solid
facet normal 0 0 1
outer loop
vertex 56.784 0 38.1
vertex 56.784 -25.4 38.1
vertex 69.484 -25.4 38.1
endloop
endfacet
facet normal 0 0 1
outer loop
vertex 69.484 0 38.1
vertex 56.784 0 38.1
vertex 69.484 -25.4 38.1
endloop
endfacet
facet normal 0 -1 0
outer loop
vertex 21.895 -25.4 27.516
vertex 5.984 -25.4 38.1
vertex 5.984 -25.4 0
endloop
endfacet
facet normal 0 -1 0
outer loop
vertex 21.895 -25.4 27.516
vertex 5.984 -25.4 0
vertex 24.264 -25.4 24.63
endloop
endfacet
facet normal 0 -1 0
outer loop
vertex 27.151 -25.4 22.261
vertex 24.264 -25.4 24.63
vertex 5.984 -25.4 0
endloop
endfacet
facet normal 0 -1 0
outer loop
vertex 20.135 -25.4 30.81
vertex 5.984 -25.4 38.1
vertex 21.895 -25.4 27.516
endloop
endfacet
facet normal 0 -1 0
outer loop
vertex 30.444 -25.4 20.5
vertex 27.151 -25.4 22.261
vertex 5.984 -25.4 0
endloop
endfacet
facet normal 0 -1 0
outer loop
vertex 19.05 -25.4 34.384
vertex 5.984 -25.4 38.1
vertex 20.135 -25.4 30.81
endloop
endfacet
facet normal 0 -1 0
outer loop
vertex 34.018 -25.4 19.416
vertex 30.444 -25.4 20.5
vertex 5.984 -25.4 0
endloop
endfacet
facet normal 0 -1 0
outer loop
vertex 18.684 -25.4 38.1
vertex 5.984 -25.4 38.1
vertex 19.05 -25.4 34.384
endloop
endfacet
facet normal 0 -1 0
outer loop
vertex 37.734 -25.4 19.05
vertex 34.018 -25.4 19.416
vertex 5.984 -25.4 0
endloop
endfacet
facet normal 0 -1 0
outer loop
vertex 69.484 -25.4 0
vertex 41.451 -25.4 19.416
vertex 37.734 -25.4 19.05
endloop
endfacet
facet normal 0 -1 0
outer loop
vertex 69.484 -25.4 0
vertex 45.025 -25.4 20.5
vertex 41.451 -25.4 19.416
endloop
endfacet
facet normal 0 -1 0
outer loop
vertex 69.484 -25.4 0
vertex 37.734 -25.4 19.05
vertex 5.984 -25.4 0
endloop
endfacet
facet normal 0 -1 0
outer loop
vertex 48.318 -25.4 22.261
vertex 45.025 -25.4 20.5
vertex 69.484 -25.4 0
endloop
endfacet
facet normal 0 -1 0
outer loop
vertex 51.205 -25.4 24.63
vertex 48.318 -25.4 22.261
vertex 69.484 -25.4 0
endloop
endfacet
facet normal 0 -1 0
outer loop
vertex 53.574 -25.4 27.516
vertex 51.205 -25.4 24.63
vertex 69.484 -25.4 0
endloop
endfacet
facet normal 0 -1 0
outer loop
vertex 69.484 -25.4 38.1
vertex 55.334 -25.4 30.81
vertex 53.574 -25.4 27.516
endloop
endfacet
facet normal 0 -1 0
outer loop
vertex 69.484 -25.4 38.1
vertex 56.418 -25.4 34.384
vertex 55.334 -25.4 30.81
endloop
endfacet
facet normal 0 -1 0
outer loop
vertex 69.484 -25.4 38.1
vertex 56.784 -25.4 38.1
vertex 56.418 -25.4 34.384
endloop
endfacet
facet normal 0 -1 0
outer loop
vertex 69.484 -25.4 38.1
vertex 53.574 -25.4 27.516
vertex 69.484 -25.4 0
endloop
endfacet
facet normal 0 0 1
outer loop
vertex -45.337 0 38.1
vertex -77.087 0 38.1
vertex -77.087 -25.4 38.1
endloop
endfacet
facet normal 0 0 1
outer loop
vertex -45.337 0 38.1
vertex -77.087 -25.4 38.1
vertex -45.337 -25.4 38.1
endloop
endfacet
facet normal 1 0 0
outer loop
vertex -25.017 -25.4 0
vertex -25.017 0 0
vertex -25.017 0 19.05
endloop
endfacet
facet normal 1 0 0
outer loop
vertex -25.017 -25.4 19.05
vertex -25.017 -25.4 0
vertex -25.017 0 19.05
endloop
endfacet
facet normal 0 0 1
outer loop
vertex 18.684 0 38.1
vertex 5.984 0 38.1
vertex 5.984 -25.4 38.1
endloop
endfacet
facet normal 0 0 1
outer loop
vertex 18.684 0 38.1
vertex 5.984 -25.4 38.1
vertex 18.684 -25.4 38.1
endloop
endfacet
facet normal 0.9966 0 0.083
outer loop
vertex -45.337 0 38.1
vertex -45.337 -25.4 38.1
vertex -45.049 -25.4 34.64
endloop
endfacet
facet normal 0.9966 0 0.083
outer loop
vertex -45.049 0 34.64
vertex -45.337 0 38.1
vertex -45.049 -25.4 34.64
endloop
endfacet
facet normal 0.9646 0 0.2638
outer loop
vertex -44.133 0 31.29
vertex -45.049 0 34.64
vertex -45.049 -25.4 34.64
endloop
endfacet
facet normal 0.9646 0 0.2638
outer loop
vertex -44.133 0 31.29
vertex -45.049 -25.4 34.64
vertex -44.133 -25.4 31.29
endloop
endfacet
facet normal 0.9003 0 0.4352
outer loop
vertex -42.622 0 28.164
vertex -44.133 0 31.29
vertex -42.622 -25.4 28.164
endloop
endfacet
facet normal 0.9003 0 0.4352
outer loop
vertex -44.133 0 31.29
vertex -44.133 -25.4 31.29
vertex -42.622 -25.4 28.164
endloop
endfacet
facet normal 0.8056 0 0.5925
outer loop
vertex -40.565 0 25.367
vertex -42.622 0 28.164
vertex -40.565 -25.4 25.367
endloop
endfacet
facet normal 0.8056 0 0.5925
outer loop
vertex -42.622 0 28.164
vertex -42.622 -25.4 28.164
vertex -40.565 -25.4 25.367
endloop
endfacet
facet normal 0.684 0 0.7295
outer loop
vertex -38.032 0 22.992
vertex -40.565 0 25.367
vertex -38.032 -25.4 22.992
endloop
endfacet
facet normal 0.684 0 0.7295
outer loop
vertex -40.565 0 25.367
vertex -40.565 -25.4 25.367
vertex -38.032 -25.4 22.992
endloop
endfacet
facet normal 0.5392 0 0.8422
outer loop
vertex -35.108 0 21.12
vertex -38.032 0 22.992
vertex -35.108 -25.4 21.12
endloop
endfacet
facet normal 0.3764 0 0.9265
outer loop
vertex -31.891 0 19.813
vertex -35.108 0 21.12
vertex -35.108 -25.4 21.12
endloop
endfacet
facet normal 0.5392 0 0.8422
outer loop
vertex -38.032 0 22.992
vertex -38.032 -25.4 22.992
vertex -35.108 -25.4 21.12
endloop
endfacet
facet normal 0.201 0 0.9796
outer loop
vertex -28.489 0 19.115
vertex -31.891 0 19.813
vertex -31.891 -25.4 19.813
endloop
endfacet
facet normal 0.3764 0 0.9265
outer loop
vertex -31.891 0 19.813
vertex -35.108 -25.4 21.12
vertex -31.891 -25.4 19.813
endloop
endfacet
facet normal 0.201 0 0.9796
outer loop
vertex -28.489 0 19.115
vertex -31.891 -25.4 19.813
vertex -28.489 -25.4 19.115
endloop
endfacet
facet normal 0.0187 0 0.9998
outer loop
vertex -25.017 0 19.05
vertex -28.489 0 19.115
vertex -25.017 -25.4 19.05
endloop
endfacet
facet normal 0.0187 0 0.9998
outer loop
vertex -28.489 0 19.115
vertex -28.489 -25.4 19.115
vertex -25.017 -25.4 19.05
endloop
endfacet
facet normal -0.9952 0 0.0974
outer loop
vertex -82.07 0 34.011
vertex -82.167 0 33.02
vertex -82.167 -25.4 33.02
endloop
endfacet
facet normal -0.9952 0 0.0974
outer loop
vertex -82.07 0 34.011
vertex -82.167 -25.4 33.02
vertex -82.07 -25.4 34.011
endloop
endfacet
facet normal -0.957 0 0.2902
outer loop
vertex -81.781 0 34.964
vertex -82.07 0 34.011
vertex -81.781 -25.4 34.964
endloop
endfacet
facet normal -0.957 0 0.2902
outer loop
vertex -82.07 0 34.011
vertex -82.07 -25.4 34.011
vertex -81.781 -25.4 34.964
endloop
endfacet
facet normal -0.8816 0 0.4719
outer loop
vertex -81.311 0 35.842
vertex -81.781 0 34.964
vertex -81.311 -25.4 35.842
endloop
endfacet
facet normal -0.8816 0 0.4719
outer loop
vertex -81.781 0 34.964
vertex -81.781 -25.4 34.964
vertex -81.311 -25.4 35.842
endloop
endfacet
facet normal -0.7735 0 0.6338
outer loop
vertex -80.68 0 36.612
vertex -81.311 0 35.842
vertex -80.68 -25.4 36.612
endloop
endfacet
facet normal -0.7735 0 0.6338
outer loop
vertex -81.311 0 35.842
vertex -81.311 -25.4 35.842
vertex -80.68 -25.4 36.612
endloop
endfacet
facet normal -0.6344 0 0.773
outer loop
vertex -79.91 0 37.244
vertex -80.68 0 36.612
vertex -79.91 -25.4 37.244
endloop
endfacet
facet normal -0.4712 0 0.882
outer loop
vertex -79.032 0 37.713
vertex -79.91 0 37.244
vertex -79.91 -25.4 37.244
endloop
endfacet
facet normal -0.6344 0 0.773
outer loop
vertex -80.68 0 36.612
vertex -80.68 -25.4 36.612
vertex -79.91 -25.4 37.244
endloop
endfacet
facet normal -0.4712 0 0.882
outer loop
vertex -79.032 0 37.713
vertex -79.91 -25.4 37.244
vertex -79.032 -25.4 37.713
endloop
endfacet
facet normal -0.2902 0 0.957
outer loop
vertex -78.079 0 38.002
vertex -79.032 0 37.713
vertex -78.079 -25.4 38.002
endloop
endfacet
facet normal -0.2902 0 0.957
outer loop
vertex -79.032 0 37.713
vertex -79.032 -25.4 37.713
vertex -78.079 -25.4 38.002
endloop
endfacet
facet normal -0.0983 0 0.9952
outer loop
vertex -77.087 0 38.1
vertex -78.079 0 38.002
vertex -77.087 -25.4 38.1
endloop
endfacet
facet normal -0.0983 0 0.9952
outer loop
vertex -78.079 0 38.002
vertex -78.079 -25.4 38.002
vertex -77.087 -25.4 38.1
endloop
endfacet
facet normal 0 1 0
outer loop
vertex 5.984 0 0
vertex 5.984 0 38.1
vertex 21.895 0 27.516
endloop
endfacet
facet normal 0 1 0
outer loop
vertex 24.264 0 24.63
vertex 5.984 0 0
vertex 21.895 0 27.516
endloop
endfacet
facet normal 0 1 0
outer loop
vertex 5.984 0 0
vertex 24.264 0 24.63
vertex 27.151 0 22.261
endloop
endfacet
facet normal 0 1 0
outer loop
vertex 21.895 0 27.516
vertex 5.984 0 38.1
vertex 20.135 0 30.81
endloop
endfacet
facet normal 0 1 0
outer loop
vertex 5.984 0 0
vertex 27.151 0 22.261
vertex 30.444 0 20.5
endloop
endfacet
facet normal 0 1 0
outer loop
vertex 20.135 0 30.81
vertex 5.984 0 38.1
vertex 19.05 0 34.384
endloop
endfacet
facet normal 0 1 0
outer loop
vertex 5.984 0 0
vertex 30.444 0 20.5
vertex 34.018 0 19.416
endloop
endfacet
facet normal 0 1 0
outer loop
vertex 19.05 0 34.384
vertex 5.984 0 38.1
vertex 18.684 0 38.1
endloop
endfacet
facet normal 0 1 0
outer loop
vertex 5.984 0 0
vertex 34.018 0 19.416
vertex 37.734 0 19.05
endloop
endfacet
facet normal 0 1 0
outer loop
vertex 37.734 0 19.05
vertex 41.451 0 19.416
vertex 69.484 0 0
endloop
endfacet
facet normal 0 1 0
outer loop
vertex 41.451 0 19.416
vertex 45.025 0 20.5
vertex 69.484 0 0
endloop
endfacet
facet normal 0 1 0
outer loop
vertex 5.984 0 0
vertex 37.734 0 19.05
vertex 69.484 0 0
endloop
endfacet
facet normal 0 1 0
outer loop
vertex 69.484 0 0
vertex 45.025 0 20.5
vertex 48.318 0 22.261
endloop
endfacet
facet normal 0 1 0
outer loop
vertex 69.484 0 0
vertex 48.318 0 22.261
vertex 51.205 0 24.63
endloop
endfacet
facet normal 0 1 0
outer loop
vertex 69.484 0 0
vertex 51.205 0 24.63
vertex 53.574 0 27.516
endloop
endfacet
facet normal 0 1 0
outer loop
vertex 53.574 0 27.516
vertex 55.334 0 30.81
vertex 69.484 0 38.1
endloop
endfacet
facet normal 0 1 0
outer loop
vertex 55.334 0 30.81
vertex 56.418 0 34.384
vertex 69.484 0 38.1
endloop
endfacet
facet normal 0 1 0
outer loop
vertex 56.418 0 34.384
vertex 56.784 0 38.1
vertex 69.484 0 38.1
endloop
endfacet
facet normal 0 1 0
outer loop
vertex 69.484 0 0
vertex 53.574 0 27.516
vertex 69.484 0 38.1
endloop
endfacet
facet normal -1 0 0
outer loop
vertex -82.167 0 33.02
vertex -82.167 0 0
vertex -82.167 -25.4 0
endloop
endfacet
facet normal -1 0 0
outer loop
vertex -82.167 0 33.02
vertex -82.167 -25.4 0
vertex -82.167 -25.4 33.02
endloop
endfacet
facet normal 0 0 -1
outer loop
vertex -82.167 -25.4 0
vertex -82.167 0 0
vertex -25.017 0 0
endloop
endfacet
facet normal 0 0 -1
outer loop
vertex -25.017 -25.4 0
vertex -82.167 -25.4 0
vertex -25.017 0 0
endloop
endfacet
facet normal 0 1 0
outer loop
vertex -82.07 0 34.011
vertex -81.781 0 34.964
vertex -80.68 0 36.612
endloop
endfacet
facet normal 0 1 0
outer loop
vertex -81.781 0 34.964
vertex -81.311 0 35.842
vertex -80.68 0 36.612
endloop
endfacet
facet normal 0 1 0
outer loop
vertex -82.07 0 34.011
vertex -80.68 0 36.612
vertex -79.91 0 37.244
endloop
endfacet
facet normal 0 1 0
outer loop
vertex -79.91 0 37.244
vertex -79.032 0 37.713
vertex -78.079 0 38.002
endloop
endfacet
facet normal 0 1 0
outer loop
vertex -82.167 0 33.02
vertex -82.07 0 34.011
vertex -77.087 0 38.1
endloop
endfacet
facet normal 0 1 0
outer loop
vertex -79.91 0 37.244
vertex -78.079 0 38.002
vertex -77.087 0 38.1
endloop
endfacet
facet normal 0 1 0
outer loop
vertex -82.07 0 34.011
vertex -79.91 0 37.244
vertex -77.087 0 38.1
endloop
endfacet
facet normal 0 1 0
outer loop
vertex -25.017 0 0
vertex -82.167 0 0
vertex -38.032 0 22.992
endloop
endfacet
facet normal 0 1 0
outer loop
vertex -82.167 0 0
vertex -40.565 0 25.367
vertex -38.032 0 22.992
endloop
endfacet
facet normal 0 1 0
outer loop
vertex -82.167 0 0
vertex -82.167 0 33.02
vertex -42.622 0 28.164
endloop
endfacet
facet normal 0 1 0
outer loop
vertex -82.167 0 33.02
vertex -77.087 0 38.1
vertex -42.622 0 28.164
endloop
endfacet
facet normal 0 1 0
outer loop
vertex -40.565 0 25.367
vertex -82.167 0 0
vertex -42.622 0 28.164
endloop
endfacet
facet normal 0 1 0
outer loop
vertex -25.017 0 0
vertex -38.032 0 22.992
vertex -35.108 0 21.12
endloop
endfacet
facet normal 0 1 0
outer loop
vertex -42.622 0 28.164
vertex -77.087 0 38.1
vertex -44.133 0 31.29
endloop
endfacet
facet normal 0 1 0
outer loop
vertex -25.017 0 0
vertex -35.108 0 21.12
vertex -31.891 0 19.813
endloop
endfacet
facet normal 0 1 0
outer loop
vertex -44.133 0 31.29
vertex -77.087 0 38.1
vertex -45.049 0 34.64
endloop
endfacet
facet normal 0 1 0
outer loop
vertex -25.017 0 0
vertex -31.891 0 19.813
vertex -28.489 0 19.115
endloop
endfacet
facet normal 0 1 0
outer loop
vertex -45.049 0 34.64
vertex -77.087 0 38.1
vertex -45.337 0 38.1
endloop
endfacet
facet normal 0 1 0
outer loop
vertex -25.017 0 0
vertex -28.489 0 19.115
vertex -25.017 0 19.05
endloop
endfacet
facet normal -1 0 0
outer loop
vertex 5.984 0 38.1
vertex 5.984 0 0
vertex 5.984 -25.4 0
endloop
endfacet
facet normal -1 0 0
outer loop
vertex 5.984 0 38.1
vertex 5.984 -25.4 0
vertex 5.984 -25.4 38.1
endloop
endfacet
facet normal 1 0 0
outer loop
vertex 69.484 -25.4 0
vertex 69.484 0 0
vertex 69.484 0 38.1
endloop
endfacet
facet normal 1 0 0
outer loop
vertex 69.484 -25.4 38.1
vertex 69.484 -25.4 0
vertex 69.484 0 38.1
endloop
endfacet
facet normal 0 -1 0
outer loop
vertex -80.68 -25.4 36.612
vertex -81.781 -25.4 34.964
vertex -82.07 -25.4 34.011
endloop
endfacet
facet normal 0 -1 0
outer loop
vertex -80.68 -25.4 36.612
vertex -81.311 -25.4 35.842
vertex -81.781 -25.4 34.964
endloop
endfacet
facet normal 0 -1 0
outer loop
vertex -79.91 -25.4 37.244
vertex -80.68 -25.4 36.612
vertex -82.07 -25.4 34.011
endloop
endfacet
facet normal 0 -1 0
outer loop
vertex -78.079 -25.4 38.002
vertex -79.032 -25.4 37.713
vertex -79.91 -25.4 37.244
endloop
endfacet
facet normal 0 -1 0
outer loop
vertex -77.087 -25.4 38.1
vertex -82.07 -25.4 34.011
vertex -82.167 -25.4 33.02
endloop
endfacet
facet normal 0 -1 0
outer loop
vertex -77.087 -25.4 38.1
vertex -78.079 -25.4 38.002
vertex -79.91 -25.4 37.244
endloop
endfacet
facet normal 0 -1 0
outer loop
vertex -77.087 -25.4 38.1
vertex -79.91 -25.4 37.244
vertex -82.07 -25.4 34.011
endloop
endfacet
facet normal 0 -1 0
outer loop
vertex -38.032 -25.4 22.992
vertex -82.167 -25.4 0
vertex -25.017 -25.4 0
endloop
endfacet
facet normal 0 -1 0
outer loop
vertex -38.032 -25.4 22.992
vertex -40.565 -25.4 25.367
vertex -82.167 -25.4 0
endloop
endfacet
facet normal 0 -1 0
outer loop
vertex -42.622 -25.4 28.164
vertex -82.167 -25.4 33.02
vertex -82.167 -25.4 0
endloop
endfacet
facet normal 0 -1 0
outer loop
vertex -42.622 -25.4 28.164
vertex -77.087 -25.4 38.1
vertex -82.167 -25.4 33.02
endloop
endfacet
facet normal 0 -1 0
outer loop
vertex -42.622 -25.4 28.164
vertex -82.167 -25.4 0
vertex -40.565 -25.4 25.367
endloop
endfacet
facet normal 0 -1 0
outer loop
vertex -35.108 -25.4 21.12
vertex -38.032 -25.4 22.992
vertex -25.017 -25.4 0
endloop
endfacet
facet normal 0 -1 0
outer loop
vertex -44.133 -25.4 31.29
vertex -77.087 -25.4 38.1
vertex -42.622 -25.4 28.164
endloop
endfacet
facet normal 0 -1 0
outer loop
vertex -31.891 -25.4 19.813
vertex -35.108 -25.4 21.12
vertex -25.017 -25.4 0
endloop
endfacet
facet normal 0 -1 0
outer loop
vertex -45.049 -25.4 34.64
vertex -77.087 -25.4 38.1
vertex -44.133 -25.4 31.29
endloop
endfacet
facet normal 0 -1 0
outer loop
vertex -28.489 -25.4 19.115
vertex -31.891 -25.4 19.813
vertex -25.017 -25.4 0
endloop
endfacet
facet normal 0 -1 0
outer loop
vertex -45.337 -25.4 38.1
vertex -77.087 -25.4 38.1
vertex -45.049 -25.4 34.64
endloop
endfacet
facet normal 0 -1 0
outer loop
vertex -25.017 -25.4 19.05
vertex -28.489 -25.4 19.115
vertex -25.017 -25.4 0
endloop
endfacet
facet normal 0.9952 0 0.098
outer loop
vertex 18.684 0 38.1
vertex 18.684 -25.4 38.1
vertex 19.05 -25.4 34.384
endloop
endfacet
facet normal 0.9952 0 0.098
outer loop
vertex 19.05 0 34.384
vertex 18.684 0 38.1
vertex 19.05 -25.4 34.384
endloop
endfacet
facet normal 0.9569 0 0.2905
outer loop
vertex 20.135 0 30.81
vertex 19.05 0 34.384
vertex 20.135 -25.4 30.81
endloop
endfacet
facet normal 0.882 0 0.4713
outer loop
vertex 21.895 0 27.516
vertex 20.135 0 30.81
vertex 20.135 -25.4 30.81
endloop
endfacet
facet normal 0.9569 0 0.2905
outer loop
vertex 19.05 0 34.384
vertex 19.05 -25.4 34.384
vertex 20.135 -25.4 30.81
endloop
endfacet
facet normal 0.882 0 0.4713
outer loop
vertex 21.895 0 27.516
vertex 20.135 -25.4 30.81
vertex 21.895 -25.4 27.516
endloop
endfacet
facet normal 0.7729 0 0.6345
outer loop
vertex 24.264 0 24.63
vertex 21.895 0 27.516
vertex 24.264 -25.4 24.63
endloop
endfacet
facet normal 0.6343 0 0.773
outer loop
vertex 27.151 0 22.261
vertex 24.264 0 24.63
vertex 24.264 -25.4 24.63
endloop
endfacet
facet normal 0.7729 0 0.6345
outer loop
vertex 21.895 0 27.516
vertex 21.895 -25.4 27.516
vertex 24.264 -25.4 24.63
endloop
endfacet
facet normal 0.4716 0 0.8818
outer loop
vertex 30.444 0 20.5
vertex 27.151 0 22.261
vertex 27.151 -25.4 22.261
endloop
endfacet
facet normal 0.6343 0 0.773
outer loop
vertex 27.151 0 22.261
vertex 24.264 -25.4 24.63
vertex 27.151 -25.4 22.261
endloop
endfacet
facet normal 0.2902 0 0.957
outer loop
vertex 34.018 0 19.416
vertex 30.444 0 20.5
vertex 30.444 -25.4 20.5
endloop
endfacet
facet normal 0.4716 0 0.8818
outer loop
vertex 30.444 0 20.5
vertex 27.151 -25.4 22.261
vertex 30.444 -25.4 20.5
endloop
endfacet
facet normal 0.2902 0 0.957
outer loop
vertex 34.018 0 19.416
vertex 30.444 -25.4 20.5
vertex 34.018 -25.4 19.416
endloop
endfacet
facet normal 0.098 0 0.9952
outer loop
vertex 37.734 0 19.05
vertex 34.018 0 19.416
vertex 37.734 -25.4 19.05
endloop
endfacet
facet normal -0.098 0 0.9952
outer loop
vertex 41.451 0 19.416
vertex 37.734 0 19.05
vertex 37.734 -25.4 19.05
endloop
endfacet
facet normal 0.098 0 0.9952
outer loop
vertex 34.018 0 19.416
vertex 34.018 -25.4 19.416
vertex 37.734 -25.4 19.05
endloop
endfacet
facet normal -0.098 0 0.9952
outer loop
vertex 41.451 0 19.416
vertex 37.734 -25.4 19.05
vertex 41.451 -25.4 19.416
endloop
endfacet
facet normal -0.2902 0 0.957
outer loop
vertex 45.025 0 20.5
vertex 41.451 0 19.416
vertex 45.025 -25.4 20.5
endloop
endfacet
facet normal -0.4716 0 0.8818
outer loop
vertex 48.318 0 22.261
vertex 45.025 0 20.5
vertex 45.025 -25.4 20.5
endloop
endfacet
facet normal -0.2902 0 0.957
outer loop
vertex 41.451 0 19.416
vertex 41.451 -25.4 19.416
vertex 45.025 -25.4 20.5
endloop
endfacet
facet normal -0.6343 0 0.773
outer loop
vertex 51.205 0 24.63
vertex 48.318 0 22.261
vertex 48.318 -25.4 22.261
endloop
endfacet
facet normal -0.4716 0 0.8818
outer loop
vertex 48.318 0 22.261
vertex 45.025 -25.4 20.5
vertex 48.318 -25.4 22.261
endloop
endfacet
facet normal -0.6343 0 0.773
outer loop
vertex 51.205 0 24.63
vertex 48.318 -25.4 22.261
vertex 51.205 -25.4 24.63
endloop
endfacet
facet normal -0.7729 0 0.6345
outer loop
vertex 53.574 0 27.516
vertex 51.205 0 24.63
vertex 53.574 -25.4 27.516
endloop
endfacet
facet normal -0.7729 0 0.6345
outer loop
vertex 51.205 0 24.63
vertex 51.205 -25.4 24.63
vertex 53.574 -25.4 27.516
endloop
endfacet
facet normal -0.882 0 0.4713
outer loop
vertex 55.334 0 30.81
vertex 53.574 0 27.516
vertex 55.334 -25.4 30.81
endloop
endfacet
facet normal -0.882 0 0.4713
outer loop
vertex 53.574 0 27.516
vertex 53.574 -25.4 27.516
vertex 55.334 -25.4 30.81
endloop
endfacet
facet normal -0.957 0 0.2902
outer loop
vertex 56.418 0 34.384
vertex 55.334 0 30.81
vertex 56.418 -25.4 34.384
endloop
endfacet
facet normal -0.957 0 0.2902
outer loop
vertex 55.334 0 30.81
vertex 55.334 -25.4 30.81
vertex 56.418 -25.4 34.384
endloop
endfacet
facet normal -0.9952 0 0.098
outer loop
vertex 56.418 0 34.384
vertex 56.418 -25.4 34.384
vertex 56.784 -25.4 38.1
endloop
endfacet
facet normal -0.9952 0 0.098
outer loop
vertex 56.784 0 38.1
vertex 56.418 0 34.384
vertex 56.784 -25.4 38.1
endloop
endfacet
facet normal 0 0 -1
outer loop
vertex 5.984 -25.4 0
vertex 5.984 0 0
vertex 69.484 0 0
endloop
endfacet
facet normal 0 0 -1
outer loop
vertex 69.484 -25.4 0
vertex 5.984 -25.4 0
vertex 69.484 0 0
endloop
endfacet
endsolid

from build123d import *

# Parameters (mm, degrees)
F0_W     = 57.15
F0_H     = 38.1
F1_DEPTH = 25.4
F2_R     = 5.08
F3_W     = 63.5
F3_H     = 38.1
F4_DEPTH = 25.4
F5_R     = 19.05
F6_DEPTH = 25.4
F8_DEPTH = 25.4


with BuildPart() as f1:
    # F0 (on Front) → F1 (new body)
    with BuildSketch(Plane.XZ):
        with Locations((-53.592469, 19.05)):
            Rectangle(F0_W, F0_H)
    extrude(amount=F1_DEPTH)

    # F2
    f2_edges = [f1.edges().sort_by_distance(p)[0] for p in [
        (-82.167469, -12.7, 38.1),
    ]]
    fillet(f2_edges, radius=F2_R)

    # F7 (on face) → F8 (cut)
    with BuildSketch(Plane.XZ.offset(25.4)):
        with BuildLine():
            Line((-25.017469, 38.1), (-45.337469, 38.1))
            ThreePointArc((-45.337469, 38.1), (-39.352847, 24.121264), (-25.017469, 19.05))
            Line((-25.017469, 19.05), (-25.017469, 38.1))
        make_face()
    extrude(amount=-F8_DEPTH, mode=Mode.SUBTRACT)


with BuildPart() as f4:
    # F3 (on Front) → F4 (new body)
    with BuildSketch(Plane.XZ):
        with Locations((37.734434, 19.05)):
            Rectangle(F3_W, F3_H)
    extrude(amount=F4_DEPTH)

    # F5 (on face) → F6 (cut)
    with BuildSketch(Plane.XZ.offset(25.4)):
        with Locations((37.734434, 38.1)):
            Circle(F5_R)
    extrude(amount=-F6_DEPTH, mode=Mode.SUBTRACT)


solid = Compound([f1.part, f4.part])
